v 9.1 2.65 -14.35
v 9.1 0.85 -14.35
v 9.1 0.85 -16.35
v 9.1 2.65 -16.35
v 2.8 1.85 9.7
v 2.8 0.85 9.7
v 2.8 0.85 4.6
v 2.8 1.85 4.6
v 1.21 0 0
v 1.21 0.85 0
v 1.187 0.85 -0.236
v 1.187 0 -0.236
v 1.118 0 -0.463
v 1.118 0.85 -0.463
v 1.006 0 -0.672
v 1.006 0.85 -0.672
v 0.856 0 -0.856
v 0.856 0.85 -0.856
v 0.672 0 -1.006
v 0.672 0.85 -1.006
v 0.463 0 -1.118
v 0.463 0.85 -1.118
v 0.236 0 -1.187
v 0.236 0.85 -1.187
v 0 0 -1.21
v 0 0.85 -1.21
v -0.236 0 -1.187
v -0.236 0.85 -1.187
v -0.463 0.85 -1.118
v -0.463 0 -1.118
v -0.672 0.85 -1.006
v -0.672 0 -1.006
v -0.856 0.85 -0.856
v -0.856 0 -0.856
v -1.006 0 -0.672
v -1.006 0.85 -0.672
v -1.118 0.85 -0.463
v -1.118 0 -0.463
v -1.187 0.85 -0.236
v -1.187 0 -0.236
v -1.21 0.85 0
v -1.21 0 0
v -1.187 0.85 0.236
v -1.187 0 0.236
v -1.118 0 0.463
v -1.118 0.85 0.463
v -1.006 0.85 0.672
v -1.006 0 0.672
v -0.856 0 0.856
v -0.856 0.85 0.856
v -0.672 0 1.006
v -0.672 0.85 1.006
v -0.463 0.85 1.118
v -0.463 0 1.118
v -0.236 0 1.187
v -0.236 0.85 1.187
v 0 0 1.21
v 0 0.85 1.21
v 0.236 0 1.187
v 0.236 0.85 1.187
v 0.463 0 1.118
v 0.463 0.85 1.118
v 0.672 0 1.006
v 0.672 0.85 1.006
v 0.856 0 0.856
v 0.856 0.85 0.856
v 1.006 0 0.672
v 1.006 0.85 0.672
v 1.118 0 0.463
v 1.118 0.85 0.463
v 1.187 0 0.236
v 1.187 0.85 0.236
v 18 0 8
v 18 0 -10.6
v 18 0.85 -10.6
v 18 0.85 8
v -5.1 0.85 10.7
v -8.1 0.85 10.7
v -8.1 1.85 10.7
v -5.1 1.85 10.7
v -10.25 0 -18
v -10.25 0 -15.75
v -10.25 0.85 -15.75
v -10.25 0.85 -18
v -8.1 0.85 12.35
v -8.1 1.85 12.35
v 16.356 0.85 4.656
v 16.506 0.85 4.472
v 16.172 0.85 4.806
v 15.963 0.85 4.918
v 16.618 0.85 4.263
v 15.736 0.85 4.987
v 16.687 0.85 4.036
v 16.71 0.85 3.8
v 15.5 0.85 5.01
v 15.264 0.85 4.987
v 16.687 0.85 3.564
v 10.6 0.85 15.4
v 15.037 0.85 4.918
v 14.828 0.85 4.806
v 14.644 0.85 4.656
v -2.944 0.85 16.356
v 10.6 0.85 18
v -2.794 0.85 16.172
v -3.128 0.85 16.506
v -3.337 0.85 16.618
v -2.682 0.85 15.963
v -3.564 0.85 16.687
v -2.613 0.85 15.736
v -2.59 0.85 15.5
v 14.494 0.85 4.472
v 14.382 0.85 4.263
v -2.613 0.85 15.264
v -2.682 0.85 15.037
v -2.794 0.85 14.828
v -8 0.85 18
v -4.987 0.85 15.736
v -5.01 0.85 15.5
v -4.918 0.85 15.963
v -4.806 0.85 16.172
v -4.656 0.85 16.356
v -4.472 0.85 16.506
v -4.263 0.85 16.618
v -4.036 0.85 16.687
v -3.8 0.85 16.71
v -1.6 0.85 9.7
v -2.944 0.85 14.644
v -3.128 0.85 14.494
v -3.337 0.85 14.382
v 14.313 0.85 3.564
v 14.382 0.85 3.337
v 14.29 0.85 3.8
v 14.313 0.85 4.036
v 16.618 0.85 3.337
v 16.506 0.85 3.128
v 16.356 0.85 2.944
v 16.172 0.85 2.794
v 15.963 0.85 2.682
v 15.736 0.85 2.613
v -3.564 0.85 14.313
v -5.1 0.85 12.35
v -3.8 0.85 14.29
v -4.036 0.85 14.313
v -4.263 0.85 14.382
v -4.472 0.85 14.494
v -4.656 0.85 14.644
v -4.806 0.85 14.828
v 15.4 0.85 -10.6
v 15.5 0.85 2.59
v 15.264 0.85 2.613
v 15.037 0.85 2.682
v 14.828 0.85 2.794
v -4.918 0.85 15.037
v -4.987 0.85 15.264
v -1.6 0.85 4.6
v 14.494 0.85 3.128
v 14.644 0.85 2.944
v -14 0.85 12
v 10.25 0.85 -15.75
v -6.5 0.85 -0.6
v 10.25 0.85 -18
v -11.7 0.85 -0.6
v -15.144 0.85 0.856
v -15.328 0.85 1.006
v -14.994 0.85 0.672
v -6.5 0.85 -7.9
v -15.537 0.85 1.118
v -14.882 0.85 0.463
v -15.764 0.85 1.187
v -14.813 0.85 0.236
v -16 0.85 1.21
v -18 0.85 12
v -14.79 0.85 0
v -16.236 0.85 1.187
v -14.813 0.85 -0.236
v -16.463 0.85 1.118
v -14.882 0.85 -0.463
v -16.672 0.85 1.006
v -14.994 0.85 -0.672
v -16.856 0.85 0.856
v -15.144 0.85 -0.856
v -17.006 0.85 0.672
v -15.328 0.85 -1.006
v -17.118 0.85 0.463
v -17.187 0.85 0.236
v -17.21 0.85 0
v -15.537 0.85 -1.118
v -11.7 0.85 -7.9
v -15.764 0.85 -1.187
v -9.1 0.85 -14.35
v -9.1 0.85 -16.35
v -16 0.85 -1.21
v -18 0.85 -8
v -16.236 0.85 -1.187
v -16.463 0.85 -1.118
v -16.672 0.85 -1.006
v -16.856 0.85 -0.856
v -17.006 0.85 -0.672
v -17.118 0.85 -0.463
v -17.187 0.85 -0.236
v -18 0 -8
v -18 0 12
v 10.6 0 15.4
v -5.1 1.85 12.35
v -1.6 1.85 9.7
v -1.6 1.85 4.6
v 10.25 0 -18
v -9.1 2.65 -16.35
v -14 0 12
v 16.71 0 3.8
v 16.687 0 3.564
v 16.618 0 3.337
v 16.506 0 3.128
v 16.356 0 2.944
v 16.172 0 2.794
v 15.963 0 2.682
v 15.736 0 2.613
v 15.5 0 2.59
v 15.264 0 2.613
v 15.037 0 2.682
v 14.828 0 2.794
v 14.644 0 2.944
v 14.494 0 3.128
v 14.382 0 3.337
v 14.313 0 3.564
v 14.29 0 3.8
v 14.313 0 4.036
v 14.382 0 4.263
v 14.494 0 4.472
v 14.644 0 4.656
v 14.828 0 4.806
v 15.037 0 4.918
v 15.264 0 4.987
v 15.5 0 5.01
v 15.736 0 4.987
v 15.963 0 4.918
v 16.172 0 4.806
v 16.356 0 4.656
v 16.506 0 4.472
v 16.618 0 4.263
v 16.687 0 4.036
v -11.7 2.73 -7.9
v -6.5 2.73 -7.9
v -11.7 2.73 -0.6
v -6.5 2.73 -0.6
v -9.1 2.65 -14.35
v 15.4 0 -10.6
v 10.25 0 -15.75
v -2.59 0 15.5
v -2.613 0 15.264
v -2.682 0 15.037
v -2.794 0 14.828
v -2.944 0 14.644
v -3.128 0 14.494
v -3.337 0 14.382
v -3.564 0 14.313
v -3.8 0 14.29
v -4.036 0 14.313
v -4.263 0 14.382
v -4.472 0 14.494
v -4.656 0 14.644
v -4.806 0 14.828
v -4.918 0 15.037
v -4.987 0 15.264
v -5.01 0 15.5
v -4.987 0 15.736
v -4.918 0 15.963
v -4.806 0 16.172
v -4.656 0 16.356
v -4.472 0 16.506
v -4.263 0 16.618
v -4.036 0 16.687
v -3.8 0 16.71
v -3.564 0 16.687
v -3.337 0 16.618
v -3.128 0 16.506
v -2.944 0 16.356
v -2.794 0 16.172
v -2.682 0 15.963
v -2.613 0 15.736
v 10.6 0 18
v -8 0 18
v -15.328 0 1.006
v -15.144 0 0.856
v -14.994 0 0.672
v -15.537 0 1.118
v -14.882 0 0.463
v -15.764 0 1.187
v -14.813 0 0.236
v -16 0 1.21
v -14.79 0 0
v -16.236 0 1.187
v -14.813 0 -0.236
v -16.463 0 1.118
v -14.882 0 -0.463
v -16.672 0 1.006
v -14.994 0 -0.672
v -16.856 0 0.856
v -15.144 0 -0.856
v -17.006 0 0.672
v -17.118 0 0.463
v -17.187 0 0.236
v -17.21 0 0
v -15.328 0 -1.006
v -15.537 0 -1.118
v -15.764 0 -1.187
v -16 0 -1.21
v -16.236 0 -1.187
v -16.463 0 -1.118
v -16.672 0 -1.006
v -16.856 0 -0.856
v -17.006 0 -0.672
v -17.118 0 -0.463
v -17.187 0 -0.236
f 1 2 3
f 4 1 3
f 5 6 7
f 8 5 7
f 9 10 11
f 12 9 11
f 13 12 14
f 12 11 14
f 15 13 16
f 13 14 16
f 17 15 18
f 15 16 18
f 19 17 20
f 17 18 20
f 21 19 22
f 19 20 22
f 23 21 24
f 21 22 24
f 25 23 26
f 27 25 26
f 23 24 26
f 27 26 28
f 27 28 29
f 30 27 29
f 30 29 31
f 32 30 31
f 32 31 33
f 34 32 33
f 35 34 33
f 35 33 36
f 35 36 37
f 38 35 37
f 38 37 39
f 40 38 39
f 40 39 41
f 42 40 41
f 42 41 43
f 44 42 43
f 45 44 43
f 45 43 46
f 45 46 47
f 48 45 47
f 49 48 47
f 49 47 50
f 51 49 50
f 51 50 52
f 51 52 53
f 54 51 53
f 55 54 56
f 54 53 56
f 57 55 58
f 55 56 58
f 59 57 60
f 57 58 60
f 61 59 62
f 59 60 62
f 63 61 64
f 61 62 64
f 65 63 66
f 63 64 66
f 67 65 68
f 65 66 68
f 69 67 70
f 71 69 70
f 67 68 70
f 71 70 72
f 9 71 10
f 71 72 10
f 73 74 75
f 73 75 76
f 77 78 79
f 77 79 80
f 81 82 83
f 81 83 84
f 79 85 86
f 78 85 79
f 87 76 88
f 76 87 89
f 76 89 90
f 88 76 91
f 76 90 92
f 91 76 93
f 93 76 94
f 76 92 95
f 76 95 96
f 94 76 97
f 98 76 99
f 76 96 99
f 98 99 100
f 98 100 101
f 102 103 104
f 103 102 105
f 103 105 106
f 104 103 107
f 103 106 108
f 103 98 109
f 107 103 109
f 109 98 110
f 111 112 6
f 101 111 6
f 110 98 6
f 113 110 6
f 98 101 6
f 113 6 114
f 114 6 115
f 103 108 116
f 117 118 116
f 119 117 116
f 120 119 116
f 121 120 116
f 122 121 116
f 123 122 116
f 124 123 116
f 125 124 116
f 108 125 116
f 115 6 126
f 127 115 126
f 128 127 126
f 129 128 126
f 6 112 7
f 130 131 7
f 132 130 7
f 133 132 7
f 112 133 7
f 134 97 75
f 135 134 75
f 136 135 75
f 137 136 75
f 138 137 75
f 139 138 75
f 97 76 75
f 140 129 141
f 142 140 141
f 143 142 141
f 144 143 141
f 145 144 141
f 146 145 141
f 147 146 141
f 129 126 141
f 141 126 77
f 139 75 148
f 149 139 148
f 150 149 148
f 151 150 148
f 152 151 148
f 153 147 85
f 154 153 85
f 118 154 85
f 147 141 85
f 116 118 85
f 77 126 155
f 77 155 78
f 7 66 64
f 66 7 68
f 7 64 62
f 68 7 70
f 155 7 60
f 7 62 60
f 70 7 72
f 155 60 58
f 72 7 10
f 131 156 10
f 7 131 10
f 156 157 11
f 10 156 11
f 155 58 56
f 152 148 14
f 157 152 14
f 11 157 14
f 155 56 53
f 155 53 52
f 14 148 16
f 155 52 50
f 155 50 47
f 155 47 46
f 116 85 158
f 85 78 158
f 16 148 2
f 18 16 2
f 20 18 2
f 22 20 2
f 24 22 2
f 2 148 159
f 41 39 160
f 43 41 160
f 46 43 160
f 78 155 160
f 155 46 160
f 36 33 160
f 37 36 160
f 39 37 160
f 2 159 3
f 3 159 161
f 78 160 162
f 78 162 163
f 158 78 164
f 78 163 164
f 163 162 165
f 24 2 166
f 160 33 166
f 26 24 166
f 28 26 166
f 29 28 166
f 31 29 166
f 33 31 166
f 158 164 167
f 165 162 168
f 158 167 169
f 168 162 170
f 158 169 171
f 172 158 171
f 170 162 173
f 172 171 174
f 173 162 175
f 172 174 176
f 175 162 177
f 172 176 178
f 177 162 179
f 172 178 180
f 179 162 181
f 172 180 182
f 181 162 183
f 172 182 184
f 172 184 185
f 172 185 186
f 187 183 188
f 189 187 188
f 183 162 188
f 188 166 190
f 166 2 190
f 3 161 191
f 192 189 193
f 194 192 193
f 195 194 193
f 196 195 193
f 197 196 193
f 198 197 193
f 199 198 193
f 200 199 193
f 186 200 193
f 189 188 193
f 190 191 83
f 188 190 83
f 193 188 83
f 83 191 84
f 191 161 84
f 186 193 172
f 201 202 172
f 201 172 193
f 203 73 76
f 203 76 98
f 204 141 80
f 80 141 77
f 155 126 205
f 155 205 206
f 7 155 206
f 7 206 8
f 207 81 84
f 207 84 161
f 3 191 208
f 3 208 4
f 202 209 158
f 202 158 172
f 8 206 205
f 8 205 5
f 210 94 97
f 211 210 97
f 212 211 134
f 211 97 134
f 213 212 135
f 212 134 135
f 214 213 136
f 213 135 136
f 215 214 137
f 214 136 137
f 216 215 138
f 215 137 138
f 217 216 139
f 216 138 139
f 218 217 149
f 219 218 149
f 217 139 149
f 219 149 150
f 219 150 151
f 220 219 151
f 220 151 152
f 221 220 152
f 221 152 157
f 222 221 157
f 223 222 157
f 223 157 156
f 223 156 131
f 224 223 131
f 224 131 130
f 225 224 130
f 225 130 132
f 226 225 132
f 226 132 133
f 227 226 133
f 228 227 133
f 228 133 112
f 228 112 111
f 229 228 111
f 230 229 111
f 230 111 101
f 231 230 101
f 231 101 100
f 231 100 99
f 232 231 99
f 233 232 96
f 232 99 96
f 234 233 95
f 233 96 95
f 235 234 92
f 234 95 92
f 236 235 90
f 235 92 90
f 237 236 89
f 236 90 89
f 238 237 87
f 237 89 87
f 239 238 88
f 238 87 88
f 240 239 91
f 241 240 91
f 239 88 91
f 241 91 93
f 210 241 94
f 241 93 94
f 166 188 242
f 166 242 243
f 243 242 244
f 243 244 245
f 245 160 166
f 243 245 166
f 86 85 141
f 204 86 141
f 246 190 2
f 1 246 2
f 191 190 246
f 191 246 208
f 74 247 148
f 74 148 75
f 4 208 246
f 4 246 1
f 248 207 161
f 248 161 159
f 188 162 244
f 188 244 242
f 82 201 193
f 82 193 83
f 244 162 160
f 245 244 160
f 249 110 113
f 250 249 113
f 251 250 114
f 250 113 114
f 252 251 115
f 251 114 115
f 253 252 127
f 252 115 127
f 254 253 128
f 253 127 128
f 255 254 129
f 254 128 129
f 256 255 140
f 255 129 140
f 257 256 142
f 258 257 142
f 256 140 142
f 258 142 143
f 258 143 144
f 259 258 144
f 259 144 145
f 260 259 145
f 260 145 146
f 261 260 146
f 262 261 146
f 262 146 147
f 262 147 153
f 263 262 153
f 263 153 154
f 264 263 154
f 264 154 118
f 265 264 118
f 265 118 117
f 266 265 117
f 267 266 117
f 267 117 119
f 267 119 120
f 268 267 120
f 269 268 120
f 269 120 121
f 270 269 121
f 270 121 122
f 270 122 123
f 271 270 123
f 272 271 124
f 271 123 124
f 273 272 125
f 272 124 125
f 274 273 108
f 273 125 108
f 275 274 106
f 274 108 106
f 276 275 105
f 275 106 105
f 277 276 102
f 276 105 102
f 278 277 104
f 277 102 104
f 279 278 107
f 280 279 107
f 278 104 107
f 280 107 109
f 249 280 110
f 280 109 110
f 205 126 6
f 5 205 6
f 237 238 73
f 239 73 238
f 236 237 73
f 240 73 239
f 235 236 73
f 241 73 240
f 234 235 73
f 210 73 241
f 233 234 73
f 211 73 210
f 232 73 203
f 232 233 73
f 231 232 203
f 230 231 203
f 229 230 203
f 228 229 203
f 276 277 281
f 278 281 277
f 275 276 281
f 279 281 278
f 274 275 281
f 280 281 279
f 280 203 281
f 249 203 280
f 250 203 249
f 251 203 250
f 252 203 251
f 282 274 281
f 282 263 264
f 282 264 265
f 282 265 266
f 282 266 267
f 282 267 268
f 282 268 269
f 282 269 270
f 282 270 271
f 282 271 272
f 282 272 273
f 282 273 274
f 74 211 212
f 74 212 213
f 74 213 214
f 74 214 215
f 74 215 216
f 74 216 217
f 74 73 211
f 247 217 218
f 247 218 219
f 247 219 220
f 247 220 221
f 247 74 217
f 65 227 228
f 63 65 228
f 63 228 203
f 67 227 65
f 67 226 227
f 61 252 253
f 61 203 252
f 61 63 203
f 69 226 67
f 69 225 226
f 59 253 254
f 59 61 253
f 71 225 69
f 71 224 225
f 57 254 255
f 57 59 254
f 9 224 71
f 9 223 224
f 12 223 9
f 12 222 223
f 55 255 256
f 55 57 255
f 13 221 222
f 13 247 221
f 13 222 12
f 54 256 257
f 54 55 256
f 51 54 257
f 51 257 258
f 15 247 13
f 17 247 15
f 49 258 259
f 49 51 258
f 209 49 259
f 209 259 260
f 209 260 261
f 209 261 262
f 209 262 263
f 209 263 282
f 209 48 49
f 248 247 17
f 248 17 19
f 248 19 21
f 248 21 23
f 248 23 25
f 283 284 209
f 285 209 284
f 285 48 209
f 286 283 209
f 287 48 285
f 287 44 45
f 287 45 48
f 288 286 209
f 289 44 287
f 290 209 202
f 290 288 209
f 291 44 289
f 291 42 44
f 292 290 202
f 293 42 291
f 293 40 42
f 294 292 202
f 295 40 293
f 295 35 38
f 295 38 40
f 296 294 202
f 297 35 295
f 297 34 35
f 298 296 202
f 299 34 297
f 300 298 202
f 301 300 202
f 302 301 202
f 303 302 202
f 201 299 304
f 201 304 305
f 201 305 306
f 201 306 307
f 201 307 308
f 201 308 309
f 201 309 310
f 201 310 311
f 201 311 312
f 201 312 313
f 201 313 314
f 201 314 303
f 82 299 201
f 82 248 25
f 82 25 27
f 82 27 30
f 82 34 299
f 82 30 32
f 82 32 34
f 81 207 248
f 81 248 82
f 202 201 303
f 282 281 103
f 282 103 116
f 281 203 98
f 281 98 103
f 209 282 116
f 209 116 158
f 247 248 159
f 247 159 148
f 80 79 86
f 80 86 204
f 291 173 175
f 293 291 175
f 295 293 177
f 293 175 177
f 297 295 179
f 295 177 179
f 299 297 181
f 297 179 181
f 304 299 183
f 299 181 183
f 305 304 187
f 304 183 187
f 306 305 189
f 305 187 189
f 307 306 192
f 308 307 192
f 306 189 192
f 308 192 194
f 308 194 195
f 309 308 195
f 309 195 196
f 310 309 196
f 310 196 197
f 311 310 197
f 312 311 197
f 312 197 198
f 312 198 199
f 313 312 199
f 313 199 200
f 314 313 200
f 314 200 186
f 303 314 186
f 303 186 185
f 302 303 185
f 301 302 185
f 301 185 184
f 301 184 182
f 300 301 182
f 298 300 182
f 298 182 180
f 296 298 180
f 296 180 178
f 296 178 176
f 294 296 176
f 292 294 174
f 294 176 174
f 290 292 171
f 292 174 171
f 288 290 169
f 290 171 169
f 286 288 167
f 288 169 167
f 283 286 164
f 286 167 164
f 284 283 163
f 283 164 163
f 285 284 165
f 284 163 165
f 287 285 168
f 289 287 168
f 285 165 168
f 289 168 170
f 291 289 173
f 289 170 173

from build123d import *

# Parameters (mm, degrees)
BOSS_EXTRUDE1_DEPTH = 0.85
SKETCH2_W           = 18.2
SKETCH2_H           = 2
BOSS_EXTRUDE2_DEPTH = 1.8
SKETCH3_W           = 5.2
SKETCH3_H           = 7.3
BOSS_EXTRUDE3_DEPTH = 1.88
SKETCH4_W           = 4.4
SKETCH4_H           = 5.1
SKETCH4_W_2         = 3
SKETCH4_H_2         = 1.65
BOSS_EXTRUDE4_DEPTH = 1
SKETCH5_R           = 1.21
CUT_EXTRUDE1_DEPTH  = 1.85


with BuildPart() as part:
    # Sketch1 → Boss-Extrude1 (new body)
    with BuildSketch(Plane(origin=(0, 0, 0), x_dir=(1, 0, 0), z_dir=(0, 1, 0))):
        Polygon((-10.25, 18), (10.25, 18), (10.25, 15.75), (15.4, 10.6), (18, 10.6), (18, -8), (10.6, -15.4), (10.6, -18), (-8, -18), (-14, -12), (-18, -12), (-18, 8), (-10.25, 15.75), align=None)
    extrude(amount=BOSS_EXTRUDE1_DEPTH)

    # Sketch2 → Boss-Extrude2 (add)
    with BuildSketch(Plane(origin=(0, 0.85, 0), x_dir=(1, 0, 0), z_dir=(0, 1, 0))):
        with Locations((0, 15.35)):
            Rectangle(SKETCH2_W, SKETCH2_H)
    extrude(amount=BOSS_EXTRUDE2_DEPTH)

    # Sketch3 → Boss-Extrude3 (add)
    with BuildSketch(Plane(origin=(0, 0.85, 0), x_dir=(1, 0, 0), z_dir=(0, 1, 0))):
        with Locations((-9.1, 4.25)):
            Rectangle(SKETCH3_W, SKETCH3_H)
    extrude(amount=BOSS_EXTRUDE3_DEPTH)

    # Sketch4 → Boss-Extrude4 (add)
    with BuildSketch(Plane(origin=(0, 0.85, 0), x_dir=(1, 0, 0), z_dir=(0, 1, 0))):
        with Locations((0.6, -7.15)):
            Rectangle(SKETCH4_W, SKETCH4_H)
        with Locations((-6.6, -11.525)):
            Rectangle(SKETCH4_W_2, SKETCH4_H_2)
    extrude(amount=BOSS_EXTRUDE4_DEPTH)

    # Sketch5 → Cut-Extrude1 (cut, through all)
    with BuildSketch(Plane(origin=(0, 0.85, 0), x_dir=(1, 0, 0), z_dir=(0, 1, 0))):
        Circle(SKETCH5_R)
        with Locations((-16, 0)):
            Circle(SKETCH5_R)
        with Locations((-3.8, -15.5)):
            Circle(SKETCH5_R)
        with Locations((15.5, -3.8)):
            Circle(SKETCH5_R)
    extrude(amount=-CUT_EXTRUDE1_DEPTH, mode=Mode.SUBTRACT)


solid = part.part
